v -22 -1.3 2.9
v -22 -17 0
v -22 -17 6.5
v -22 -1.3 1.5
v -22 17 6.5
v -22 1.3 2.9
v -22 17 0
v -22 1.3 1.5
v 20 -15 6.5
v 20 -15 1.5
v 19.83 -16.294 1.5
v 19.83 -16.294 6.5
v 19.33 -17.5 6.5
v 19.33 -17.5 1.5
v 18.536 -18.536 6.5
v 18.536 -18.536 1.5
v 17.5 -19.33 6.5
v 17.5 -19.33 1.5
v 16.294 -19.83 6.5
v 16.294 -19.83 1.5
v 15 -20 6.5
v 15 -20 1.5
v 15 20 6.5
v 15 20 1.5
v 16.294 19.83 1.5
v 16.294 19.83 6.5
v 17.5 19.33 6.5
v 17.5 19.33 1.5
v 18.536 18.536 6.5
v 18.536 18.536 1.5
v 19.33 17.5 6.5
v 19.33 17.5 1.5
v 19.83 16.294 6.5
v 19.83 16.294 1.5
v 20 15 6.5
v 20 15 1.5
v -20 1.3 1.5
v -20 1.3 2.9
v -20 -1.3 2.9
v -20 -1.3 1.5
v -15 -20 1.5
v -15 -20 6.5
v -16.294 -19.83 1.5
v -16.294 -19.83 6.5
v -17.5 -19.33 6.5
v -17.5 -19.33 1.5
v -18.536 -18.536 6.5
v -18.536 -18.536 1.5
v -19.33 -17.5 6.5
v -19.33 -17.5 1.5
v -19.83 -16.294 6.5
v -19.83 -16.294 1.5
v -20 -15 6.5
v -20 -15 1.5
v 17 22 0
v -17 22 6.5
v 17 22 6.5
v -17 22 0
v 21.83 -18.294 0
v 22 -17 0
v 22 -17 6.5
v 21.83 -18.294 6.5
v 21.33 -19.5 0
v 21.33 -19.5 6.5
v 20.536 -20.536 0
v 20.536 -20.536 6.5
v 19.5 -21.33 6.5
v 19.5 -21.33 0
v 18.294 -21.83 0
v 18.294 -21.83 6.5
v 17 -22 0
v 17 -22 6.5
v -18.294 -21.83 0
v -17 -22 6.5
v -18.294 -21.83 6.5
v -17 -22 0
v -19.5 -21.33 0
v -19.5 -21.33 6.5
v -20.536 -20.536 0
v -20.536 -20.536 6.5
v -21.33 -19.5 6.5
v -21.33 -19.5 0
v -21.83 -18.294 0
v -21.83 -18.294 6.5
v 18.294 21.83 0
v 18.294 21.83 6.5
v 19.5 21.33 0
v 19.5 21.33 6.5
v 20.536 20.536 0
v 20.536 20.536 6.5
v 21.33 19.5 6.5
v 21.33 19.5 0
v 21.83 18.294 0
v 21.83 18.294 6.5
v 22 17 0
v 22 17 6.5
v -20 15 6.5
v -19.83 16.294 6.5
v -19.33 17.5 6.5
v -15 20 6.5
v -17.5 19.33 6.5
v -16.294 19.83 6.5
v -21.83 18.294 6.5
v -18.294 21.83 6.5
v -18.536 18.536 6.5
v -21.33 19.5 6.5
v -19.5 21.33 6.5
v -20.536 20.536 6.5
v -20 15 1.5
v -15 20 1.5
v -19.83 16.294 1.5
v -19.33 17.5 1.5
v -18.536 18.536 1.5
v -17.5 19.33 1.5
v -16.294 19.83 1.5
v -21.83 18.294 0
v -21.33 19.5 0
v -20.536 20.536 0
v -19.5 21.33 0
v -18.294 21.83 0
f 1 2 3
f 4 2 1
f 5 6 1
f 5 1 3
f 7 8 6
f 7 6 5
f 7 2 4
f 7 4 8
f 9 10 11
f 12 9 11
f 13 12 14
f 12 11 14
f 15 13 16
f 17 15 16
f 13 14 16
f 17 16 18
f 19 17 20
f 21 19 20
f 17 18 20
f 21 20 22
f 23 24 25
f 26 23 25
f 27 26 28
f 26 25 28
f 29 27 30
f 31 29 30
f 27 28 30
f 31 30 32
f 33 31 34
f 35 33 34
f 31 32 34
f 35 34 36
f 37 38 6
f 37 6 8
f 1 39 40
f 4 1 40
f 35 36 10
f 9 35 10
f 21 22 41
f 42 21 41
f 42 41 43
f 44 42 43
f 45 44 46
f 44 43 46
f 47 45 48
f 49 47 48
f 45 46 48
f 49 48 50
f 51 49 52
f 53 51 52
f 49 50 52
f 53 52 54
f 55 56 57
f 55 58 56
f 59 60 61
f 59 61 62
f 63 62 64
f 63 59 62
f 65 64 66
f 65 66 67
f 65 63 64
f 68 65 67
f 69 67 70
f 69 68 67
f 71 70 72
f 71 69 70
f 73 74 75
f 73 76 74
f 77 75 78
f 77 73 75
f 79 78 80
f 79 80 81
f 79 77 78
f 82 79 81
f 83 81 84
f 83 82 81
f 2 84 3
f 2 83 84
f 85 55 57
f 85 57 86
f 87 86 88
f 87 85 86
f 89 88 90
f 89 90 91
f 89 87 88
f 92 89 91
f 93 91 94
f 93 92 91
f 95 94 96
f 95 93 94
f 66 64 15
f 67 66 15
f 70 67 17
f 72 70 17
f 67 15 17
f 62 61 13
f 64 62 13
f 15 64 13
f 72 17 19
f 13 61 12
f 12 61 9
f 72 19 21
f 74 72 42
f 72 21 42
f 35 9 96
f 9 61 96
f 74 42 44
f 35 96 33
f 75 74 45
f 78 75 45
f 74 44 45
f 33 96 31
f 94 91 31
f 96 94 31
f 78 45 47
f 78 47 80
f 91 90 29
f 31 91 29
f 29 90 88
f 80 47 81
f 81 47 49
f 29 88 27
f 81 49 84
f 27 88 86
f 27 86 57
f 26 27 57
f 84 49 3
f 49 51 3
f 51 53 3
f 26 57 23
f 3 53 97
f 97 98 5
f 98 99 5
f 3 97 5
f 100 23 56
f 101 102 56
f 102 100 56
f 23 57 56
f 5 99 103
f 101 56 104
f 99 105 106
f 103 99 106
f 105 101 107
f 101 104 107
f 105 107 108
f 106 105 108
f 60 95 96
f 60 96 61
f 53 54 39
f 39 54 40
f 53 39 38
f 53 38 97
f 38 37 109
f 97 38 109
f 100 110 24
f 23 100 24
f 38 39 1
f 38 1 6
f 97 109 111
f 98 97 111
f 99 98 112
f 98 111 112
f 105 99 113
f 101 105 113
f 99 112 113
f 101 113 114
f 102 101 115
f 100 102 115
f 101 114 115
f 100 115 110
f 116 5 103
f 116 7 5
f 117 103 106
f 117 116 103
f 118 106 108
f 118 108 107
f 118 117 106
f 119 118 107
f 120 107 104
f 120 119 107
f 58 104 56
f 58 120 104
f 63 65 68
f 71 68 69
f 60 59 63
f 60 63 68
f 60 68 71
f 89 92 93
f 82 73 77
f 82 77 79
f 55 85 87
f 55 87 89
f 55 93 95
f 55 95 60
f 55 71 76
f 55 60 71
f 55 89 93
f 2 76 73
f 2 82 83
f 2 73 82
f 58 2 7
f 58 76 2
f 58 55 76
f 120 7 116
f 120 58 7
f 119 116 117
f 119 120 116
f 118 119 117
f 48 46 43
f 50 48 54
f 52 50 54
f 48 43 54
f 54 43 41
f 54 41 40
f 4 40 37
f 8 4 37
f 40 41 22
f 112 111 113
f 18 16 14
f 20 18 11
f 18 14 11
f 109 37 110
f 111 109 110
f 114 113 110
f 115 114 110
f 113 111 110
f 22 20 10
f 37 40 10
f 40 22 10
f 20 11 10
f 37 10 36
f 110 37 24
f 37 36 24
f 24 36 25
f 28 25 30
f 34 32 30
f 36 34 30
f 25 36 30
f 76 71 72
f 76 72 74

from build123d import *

# Parameters (mm, degrees)
EXTRUDE_1_DEPTH     = 1.5
EXTRUDE_2_DEPTH     = 5
SKETCH_5_W          = 1.4
SKETCH_5_H          = 2.6
CUT_EXTRUDE_1_DEPTH = 48.8565565


with BuildPart() as part:
    # 草图1 → 凸台-拉伸1 (new body)
    with BuildSketch(Plane.XY):
        with BuildLine():
            Line((-17, 22), (17, 22))
            ThreePointArc((17, 22), (20.535533906, 20.535533906), (22, 17))
            Line((22, 17), (22, -17))
            ThreePointArc((22, -17), (20.535533906, -20.535533906), (17, -22))
            Line((17, -22), (-17, -22))
            ThreePointArc((-17, -22), (-20.535533906, -20.535533906), (-22, -17))
            Line((-22, -17), (-22, 17))
            ThreePointArc((-22, 17), (-20.535533906, 20.535533906), (-17, 22))
        make_face()
    extrude(amount=EXTRUDE_1_DEPTH)

    # 草图2 → 凸台-拉伸2 (add)
    with BuildSketch(Plane.XY.offset(1.5)):
        with BuildLine():
            Line((-17, 22), (17, 22))
            ThreePointArc((17, 22), (20.535533906, 20.535533906), (22, 17))
            Line((22, 17), (22, -17))
            ThreePointArc((22, -17), (20.535533906, -20.535533906), (17, -22))
            Line((17, -22), (-17, -22))
            ThreePointArc((-17, -22), (-20.535533906, -20.535533906), (-22, -17))
            Line((-22, -17), (-22, 17))
            ThreePointArc((-22, 17), (-20.535533906, 20.535533906), (-17, 22))
        make_face()
        with BuildLine():
            Line((-15, 20), (15, 20))
            ThreePointArc((15, 20), (18.535533906, 18.535533906), (20, 15))
            Line((20, 15), (20, -15))
            ThreePointArc((20, -15), (18.535533906, -18.535533906), (15, -20))
            Line((15, -20), (-15, -20))
            ThreePointArc((-15, -20), (-18.535533906, -18.535533906), (-20, -15))
            Line((-20, -15), (-20, 15))
            ThreePointArc((-20, 15), (-18.535533906, 18.535533906), (-15, 20))
        make_face(mode=Mode.SUBTRACT)
    extrude(amount=EXTRUDE_2_DEPTH)

    # 草图5 → 切除-拉伸1 (cut, through all)
    with BuildSketch(Plane(origin=(-20, 0, 0), x_dir=(0, 0, -1), z_dir=(1, 0, 0))):
        with Locations((-2.2, 0)):
            Rectangle(SKETCH_5_W, SKETCH_5_H)
    extrude(amount=-CUT_EXTRUDE_1_DEPTH, mode=Mode.SUBTRACT)


solid = part.part
